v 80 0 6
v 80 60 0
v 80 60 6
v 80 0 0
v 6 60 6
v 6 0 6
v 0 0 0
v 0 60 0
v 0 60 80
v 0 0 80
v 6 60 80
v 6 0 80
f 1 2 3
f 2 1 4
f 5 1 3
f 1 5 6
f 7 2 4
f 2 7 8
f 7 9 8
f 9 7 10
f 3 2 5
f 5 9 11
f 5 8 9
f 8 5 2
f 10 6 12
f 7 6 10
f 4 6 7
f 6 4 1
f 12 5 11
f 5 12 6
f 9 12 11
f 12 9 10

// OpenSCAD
// Generated by Text-to-CAD from prompt:
// an L-bracket
$fn = 64;

module Bracket() {
cube([80, 60, 6]);
cube([6, 60, 80]);
}

Bracket();
